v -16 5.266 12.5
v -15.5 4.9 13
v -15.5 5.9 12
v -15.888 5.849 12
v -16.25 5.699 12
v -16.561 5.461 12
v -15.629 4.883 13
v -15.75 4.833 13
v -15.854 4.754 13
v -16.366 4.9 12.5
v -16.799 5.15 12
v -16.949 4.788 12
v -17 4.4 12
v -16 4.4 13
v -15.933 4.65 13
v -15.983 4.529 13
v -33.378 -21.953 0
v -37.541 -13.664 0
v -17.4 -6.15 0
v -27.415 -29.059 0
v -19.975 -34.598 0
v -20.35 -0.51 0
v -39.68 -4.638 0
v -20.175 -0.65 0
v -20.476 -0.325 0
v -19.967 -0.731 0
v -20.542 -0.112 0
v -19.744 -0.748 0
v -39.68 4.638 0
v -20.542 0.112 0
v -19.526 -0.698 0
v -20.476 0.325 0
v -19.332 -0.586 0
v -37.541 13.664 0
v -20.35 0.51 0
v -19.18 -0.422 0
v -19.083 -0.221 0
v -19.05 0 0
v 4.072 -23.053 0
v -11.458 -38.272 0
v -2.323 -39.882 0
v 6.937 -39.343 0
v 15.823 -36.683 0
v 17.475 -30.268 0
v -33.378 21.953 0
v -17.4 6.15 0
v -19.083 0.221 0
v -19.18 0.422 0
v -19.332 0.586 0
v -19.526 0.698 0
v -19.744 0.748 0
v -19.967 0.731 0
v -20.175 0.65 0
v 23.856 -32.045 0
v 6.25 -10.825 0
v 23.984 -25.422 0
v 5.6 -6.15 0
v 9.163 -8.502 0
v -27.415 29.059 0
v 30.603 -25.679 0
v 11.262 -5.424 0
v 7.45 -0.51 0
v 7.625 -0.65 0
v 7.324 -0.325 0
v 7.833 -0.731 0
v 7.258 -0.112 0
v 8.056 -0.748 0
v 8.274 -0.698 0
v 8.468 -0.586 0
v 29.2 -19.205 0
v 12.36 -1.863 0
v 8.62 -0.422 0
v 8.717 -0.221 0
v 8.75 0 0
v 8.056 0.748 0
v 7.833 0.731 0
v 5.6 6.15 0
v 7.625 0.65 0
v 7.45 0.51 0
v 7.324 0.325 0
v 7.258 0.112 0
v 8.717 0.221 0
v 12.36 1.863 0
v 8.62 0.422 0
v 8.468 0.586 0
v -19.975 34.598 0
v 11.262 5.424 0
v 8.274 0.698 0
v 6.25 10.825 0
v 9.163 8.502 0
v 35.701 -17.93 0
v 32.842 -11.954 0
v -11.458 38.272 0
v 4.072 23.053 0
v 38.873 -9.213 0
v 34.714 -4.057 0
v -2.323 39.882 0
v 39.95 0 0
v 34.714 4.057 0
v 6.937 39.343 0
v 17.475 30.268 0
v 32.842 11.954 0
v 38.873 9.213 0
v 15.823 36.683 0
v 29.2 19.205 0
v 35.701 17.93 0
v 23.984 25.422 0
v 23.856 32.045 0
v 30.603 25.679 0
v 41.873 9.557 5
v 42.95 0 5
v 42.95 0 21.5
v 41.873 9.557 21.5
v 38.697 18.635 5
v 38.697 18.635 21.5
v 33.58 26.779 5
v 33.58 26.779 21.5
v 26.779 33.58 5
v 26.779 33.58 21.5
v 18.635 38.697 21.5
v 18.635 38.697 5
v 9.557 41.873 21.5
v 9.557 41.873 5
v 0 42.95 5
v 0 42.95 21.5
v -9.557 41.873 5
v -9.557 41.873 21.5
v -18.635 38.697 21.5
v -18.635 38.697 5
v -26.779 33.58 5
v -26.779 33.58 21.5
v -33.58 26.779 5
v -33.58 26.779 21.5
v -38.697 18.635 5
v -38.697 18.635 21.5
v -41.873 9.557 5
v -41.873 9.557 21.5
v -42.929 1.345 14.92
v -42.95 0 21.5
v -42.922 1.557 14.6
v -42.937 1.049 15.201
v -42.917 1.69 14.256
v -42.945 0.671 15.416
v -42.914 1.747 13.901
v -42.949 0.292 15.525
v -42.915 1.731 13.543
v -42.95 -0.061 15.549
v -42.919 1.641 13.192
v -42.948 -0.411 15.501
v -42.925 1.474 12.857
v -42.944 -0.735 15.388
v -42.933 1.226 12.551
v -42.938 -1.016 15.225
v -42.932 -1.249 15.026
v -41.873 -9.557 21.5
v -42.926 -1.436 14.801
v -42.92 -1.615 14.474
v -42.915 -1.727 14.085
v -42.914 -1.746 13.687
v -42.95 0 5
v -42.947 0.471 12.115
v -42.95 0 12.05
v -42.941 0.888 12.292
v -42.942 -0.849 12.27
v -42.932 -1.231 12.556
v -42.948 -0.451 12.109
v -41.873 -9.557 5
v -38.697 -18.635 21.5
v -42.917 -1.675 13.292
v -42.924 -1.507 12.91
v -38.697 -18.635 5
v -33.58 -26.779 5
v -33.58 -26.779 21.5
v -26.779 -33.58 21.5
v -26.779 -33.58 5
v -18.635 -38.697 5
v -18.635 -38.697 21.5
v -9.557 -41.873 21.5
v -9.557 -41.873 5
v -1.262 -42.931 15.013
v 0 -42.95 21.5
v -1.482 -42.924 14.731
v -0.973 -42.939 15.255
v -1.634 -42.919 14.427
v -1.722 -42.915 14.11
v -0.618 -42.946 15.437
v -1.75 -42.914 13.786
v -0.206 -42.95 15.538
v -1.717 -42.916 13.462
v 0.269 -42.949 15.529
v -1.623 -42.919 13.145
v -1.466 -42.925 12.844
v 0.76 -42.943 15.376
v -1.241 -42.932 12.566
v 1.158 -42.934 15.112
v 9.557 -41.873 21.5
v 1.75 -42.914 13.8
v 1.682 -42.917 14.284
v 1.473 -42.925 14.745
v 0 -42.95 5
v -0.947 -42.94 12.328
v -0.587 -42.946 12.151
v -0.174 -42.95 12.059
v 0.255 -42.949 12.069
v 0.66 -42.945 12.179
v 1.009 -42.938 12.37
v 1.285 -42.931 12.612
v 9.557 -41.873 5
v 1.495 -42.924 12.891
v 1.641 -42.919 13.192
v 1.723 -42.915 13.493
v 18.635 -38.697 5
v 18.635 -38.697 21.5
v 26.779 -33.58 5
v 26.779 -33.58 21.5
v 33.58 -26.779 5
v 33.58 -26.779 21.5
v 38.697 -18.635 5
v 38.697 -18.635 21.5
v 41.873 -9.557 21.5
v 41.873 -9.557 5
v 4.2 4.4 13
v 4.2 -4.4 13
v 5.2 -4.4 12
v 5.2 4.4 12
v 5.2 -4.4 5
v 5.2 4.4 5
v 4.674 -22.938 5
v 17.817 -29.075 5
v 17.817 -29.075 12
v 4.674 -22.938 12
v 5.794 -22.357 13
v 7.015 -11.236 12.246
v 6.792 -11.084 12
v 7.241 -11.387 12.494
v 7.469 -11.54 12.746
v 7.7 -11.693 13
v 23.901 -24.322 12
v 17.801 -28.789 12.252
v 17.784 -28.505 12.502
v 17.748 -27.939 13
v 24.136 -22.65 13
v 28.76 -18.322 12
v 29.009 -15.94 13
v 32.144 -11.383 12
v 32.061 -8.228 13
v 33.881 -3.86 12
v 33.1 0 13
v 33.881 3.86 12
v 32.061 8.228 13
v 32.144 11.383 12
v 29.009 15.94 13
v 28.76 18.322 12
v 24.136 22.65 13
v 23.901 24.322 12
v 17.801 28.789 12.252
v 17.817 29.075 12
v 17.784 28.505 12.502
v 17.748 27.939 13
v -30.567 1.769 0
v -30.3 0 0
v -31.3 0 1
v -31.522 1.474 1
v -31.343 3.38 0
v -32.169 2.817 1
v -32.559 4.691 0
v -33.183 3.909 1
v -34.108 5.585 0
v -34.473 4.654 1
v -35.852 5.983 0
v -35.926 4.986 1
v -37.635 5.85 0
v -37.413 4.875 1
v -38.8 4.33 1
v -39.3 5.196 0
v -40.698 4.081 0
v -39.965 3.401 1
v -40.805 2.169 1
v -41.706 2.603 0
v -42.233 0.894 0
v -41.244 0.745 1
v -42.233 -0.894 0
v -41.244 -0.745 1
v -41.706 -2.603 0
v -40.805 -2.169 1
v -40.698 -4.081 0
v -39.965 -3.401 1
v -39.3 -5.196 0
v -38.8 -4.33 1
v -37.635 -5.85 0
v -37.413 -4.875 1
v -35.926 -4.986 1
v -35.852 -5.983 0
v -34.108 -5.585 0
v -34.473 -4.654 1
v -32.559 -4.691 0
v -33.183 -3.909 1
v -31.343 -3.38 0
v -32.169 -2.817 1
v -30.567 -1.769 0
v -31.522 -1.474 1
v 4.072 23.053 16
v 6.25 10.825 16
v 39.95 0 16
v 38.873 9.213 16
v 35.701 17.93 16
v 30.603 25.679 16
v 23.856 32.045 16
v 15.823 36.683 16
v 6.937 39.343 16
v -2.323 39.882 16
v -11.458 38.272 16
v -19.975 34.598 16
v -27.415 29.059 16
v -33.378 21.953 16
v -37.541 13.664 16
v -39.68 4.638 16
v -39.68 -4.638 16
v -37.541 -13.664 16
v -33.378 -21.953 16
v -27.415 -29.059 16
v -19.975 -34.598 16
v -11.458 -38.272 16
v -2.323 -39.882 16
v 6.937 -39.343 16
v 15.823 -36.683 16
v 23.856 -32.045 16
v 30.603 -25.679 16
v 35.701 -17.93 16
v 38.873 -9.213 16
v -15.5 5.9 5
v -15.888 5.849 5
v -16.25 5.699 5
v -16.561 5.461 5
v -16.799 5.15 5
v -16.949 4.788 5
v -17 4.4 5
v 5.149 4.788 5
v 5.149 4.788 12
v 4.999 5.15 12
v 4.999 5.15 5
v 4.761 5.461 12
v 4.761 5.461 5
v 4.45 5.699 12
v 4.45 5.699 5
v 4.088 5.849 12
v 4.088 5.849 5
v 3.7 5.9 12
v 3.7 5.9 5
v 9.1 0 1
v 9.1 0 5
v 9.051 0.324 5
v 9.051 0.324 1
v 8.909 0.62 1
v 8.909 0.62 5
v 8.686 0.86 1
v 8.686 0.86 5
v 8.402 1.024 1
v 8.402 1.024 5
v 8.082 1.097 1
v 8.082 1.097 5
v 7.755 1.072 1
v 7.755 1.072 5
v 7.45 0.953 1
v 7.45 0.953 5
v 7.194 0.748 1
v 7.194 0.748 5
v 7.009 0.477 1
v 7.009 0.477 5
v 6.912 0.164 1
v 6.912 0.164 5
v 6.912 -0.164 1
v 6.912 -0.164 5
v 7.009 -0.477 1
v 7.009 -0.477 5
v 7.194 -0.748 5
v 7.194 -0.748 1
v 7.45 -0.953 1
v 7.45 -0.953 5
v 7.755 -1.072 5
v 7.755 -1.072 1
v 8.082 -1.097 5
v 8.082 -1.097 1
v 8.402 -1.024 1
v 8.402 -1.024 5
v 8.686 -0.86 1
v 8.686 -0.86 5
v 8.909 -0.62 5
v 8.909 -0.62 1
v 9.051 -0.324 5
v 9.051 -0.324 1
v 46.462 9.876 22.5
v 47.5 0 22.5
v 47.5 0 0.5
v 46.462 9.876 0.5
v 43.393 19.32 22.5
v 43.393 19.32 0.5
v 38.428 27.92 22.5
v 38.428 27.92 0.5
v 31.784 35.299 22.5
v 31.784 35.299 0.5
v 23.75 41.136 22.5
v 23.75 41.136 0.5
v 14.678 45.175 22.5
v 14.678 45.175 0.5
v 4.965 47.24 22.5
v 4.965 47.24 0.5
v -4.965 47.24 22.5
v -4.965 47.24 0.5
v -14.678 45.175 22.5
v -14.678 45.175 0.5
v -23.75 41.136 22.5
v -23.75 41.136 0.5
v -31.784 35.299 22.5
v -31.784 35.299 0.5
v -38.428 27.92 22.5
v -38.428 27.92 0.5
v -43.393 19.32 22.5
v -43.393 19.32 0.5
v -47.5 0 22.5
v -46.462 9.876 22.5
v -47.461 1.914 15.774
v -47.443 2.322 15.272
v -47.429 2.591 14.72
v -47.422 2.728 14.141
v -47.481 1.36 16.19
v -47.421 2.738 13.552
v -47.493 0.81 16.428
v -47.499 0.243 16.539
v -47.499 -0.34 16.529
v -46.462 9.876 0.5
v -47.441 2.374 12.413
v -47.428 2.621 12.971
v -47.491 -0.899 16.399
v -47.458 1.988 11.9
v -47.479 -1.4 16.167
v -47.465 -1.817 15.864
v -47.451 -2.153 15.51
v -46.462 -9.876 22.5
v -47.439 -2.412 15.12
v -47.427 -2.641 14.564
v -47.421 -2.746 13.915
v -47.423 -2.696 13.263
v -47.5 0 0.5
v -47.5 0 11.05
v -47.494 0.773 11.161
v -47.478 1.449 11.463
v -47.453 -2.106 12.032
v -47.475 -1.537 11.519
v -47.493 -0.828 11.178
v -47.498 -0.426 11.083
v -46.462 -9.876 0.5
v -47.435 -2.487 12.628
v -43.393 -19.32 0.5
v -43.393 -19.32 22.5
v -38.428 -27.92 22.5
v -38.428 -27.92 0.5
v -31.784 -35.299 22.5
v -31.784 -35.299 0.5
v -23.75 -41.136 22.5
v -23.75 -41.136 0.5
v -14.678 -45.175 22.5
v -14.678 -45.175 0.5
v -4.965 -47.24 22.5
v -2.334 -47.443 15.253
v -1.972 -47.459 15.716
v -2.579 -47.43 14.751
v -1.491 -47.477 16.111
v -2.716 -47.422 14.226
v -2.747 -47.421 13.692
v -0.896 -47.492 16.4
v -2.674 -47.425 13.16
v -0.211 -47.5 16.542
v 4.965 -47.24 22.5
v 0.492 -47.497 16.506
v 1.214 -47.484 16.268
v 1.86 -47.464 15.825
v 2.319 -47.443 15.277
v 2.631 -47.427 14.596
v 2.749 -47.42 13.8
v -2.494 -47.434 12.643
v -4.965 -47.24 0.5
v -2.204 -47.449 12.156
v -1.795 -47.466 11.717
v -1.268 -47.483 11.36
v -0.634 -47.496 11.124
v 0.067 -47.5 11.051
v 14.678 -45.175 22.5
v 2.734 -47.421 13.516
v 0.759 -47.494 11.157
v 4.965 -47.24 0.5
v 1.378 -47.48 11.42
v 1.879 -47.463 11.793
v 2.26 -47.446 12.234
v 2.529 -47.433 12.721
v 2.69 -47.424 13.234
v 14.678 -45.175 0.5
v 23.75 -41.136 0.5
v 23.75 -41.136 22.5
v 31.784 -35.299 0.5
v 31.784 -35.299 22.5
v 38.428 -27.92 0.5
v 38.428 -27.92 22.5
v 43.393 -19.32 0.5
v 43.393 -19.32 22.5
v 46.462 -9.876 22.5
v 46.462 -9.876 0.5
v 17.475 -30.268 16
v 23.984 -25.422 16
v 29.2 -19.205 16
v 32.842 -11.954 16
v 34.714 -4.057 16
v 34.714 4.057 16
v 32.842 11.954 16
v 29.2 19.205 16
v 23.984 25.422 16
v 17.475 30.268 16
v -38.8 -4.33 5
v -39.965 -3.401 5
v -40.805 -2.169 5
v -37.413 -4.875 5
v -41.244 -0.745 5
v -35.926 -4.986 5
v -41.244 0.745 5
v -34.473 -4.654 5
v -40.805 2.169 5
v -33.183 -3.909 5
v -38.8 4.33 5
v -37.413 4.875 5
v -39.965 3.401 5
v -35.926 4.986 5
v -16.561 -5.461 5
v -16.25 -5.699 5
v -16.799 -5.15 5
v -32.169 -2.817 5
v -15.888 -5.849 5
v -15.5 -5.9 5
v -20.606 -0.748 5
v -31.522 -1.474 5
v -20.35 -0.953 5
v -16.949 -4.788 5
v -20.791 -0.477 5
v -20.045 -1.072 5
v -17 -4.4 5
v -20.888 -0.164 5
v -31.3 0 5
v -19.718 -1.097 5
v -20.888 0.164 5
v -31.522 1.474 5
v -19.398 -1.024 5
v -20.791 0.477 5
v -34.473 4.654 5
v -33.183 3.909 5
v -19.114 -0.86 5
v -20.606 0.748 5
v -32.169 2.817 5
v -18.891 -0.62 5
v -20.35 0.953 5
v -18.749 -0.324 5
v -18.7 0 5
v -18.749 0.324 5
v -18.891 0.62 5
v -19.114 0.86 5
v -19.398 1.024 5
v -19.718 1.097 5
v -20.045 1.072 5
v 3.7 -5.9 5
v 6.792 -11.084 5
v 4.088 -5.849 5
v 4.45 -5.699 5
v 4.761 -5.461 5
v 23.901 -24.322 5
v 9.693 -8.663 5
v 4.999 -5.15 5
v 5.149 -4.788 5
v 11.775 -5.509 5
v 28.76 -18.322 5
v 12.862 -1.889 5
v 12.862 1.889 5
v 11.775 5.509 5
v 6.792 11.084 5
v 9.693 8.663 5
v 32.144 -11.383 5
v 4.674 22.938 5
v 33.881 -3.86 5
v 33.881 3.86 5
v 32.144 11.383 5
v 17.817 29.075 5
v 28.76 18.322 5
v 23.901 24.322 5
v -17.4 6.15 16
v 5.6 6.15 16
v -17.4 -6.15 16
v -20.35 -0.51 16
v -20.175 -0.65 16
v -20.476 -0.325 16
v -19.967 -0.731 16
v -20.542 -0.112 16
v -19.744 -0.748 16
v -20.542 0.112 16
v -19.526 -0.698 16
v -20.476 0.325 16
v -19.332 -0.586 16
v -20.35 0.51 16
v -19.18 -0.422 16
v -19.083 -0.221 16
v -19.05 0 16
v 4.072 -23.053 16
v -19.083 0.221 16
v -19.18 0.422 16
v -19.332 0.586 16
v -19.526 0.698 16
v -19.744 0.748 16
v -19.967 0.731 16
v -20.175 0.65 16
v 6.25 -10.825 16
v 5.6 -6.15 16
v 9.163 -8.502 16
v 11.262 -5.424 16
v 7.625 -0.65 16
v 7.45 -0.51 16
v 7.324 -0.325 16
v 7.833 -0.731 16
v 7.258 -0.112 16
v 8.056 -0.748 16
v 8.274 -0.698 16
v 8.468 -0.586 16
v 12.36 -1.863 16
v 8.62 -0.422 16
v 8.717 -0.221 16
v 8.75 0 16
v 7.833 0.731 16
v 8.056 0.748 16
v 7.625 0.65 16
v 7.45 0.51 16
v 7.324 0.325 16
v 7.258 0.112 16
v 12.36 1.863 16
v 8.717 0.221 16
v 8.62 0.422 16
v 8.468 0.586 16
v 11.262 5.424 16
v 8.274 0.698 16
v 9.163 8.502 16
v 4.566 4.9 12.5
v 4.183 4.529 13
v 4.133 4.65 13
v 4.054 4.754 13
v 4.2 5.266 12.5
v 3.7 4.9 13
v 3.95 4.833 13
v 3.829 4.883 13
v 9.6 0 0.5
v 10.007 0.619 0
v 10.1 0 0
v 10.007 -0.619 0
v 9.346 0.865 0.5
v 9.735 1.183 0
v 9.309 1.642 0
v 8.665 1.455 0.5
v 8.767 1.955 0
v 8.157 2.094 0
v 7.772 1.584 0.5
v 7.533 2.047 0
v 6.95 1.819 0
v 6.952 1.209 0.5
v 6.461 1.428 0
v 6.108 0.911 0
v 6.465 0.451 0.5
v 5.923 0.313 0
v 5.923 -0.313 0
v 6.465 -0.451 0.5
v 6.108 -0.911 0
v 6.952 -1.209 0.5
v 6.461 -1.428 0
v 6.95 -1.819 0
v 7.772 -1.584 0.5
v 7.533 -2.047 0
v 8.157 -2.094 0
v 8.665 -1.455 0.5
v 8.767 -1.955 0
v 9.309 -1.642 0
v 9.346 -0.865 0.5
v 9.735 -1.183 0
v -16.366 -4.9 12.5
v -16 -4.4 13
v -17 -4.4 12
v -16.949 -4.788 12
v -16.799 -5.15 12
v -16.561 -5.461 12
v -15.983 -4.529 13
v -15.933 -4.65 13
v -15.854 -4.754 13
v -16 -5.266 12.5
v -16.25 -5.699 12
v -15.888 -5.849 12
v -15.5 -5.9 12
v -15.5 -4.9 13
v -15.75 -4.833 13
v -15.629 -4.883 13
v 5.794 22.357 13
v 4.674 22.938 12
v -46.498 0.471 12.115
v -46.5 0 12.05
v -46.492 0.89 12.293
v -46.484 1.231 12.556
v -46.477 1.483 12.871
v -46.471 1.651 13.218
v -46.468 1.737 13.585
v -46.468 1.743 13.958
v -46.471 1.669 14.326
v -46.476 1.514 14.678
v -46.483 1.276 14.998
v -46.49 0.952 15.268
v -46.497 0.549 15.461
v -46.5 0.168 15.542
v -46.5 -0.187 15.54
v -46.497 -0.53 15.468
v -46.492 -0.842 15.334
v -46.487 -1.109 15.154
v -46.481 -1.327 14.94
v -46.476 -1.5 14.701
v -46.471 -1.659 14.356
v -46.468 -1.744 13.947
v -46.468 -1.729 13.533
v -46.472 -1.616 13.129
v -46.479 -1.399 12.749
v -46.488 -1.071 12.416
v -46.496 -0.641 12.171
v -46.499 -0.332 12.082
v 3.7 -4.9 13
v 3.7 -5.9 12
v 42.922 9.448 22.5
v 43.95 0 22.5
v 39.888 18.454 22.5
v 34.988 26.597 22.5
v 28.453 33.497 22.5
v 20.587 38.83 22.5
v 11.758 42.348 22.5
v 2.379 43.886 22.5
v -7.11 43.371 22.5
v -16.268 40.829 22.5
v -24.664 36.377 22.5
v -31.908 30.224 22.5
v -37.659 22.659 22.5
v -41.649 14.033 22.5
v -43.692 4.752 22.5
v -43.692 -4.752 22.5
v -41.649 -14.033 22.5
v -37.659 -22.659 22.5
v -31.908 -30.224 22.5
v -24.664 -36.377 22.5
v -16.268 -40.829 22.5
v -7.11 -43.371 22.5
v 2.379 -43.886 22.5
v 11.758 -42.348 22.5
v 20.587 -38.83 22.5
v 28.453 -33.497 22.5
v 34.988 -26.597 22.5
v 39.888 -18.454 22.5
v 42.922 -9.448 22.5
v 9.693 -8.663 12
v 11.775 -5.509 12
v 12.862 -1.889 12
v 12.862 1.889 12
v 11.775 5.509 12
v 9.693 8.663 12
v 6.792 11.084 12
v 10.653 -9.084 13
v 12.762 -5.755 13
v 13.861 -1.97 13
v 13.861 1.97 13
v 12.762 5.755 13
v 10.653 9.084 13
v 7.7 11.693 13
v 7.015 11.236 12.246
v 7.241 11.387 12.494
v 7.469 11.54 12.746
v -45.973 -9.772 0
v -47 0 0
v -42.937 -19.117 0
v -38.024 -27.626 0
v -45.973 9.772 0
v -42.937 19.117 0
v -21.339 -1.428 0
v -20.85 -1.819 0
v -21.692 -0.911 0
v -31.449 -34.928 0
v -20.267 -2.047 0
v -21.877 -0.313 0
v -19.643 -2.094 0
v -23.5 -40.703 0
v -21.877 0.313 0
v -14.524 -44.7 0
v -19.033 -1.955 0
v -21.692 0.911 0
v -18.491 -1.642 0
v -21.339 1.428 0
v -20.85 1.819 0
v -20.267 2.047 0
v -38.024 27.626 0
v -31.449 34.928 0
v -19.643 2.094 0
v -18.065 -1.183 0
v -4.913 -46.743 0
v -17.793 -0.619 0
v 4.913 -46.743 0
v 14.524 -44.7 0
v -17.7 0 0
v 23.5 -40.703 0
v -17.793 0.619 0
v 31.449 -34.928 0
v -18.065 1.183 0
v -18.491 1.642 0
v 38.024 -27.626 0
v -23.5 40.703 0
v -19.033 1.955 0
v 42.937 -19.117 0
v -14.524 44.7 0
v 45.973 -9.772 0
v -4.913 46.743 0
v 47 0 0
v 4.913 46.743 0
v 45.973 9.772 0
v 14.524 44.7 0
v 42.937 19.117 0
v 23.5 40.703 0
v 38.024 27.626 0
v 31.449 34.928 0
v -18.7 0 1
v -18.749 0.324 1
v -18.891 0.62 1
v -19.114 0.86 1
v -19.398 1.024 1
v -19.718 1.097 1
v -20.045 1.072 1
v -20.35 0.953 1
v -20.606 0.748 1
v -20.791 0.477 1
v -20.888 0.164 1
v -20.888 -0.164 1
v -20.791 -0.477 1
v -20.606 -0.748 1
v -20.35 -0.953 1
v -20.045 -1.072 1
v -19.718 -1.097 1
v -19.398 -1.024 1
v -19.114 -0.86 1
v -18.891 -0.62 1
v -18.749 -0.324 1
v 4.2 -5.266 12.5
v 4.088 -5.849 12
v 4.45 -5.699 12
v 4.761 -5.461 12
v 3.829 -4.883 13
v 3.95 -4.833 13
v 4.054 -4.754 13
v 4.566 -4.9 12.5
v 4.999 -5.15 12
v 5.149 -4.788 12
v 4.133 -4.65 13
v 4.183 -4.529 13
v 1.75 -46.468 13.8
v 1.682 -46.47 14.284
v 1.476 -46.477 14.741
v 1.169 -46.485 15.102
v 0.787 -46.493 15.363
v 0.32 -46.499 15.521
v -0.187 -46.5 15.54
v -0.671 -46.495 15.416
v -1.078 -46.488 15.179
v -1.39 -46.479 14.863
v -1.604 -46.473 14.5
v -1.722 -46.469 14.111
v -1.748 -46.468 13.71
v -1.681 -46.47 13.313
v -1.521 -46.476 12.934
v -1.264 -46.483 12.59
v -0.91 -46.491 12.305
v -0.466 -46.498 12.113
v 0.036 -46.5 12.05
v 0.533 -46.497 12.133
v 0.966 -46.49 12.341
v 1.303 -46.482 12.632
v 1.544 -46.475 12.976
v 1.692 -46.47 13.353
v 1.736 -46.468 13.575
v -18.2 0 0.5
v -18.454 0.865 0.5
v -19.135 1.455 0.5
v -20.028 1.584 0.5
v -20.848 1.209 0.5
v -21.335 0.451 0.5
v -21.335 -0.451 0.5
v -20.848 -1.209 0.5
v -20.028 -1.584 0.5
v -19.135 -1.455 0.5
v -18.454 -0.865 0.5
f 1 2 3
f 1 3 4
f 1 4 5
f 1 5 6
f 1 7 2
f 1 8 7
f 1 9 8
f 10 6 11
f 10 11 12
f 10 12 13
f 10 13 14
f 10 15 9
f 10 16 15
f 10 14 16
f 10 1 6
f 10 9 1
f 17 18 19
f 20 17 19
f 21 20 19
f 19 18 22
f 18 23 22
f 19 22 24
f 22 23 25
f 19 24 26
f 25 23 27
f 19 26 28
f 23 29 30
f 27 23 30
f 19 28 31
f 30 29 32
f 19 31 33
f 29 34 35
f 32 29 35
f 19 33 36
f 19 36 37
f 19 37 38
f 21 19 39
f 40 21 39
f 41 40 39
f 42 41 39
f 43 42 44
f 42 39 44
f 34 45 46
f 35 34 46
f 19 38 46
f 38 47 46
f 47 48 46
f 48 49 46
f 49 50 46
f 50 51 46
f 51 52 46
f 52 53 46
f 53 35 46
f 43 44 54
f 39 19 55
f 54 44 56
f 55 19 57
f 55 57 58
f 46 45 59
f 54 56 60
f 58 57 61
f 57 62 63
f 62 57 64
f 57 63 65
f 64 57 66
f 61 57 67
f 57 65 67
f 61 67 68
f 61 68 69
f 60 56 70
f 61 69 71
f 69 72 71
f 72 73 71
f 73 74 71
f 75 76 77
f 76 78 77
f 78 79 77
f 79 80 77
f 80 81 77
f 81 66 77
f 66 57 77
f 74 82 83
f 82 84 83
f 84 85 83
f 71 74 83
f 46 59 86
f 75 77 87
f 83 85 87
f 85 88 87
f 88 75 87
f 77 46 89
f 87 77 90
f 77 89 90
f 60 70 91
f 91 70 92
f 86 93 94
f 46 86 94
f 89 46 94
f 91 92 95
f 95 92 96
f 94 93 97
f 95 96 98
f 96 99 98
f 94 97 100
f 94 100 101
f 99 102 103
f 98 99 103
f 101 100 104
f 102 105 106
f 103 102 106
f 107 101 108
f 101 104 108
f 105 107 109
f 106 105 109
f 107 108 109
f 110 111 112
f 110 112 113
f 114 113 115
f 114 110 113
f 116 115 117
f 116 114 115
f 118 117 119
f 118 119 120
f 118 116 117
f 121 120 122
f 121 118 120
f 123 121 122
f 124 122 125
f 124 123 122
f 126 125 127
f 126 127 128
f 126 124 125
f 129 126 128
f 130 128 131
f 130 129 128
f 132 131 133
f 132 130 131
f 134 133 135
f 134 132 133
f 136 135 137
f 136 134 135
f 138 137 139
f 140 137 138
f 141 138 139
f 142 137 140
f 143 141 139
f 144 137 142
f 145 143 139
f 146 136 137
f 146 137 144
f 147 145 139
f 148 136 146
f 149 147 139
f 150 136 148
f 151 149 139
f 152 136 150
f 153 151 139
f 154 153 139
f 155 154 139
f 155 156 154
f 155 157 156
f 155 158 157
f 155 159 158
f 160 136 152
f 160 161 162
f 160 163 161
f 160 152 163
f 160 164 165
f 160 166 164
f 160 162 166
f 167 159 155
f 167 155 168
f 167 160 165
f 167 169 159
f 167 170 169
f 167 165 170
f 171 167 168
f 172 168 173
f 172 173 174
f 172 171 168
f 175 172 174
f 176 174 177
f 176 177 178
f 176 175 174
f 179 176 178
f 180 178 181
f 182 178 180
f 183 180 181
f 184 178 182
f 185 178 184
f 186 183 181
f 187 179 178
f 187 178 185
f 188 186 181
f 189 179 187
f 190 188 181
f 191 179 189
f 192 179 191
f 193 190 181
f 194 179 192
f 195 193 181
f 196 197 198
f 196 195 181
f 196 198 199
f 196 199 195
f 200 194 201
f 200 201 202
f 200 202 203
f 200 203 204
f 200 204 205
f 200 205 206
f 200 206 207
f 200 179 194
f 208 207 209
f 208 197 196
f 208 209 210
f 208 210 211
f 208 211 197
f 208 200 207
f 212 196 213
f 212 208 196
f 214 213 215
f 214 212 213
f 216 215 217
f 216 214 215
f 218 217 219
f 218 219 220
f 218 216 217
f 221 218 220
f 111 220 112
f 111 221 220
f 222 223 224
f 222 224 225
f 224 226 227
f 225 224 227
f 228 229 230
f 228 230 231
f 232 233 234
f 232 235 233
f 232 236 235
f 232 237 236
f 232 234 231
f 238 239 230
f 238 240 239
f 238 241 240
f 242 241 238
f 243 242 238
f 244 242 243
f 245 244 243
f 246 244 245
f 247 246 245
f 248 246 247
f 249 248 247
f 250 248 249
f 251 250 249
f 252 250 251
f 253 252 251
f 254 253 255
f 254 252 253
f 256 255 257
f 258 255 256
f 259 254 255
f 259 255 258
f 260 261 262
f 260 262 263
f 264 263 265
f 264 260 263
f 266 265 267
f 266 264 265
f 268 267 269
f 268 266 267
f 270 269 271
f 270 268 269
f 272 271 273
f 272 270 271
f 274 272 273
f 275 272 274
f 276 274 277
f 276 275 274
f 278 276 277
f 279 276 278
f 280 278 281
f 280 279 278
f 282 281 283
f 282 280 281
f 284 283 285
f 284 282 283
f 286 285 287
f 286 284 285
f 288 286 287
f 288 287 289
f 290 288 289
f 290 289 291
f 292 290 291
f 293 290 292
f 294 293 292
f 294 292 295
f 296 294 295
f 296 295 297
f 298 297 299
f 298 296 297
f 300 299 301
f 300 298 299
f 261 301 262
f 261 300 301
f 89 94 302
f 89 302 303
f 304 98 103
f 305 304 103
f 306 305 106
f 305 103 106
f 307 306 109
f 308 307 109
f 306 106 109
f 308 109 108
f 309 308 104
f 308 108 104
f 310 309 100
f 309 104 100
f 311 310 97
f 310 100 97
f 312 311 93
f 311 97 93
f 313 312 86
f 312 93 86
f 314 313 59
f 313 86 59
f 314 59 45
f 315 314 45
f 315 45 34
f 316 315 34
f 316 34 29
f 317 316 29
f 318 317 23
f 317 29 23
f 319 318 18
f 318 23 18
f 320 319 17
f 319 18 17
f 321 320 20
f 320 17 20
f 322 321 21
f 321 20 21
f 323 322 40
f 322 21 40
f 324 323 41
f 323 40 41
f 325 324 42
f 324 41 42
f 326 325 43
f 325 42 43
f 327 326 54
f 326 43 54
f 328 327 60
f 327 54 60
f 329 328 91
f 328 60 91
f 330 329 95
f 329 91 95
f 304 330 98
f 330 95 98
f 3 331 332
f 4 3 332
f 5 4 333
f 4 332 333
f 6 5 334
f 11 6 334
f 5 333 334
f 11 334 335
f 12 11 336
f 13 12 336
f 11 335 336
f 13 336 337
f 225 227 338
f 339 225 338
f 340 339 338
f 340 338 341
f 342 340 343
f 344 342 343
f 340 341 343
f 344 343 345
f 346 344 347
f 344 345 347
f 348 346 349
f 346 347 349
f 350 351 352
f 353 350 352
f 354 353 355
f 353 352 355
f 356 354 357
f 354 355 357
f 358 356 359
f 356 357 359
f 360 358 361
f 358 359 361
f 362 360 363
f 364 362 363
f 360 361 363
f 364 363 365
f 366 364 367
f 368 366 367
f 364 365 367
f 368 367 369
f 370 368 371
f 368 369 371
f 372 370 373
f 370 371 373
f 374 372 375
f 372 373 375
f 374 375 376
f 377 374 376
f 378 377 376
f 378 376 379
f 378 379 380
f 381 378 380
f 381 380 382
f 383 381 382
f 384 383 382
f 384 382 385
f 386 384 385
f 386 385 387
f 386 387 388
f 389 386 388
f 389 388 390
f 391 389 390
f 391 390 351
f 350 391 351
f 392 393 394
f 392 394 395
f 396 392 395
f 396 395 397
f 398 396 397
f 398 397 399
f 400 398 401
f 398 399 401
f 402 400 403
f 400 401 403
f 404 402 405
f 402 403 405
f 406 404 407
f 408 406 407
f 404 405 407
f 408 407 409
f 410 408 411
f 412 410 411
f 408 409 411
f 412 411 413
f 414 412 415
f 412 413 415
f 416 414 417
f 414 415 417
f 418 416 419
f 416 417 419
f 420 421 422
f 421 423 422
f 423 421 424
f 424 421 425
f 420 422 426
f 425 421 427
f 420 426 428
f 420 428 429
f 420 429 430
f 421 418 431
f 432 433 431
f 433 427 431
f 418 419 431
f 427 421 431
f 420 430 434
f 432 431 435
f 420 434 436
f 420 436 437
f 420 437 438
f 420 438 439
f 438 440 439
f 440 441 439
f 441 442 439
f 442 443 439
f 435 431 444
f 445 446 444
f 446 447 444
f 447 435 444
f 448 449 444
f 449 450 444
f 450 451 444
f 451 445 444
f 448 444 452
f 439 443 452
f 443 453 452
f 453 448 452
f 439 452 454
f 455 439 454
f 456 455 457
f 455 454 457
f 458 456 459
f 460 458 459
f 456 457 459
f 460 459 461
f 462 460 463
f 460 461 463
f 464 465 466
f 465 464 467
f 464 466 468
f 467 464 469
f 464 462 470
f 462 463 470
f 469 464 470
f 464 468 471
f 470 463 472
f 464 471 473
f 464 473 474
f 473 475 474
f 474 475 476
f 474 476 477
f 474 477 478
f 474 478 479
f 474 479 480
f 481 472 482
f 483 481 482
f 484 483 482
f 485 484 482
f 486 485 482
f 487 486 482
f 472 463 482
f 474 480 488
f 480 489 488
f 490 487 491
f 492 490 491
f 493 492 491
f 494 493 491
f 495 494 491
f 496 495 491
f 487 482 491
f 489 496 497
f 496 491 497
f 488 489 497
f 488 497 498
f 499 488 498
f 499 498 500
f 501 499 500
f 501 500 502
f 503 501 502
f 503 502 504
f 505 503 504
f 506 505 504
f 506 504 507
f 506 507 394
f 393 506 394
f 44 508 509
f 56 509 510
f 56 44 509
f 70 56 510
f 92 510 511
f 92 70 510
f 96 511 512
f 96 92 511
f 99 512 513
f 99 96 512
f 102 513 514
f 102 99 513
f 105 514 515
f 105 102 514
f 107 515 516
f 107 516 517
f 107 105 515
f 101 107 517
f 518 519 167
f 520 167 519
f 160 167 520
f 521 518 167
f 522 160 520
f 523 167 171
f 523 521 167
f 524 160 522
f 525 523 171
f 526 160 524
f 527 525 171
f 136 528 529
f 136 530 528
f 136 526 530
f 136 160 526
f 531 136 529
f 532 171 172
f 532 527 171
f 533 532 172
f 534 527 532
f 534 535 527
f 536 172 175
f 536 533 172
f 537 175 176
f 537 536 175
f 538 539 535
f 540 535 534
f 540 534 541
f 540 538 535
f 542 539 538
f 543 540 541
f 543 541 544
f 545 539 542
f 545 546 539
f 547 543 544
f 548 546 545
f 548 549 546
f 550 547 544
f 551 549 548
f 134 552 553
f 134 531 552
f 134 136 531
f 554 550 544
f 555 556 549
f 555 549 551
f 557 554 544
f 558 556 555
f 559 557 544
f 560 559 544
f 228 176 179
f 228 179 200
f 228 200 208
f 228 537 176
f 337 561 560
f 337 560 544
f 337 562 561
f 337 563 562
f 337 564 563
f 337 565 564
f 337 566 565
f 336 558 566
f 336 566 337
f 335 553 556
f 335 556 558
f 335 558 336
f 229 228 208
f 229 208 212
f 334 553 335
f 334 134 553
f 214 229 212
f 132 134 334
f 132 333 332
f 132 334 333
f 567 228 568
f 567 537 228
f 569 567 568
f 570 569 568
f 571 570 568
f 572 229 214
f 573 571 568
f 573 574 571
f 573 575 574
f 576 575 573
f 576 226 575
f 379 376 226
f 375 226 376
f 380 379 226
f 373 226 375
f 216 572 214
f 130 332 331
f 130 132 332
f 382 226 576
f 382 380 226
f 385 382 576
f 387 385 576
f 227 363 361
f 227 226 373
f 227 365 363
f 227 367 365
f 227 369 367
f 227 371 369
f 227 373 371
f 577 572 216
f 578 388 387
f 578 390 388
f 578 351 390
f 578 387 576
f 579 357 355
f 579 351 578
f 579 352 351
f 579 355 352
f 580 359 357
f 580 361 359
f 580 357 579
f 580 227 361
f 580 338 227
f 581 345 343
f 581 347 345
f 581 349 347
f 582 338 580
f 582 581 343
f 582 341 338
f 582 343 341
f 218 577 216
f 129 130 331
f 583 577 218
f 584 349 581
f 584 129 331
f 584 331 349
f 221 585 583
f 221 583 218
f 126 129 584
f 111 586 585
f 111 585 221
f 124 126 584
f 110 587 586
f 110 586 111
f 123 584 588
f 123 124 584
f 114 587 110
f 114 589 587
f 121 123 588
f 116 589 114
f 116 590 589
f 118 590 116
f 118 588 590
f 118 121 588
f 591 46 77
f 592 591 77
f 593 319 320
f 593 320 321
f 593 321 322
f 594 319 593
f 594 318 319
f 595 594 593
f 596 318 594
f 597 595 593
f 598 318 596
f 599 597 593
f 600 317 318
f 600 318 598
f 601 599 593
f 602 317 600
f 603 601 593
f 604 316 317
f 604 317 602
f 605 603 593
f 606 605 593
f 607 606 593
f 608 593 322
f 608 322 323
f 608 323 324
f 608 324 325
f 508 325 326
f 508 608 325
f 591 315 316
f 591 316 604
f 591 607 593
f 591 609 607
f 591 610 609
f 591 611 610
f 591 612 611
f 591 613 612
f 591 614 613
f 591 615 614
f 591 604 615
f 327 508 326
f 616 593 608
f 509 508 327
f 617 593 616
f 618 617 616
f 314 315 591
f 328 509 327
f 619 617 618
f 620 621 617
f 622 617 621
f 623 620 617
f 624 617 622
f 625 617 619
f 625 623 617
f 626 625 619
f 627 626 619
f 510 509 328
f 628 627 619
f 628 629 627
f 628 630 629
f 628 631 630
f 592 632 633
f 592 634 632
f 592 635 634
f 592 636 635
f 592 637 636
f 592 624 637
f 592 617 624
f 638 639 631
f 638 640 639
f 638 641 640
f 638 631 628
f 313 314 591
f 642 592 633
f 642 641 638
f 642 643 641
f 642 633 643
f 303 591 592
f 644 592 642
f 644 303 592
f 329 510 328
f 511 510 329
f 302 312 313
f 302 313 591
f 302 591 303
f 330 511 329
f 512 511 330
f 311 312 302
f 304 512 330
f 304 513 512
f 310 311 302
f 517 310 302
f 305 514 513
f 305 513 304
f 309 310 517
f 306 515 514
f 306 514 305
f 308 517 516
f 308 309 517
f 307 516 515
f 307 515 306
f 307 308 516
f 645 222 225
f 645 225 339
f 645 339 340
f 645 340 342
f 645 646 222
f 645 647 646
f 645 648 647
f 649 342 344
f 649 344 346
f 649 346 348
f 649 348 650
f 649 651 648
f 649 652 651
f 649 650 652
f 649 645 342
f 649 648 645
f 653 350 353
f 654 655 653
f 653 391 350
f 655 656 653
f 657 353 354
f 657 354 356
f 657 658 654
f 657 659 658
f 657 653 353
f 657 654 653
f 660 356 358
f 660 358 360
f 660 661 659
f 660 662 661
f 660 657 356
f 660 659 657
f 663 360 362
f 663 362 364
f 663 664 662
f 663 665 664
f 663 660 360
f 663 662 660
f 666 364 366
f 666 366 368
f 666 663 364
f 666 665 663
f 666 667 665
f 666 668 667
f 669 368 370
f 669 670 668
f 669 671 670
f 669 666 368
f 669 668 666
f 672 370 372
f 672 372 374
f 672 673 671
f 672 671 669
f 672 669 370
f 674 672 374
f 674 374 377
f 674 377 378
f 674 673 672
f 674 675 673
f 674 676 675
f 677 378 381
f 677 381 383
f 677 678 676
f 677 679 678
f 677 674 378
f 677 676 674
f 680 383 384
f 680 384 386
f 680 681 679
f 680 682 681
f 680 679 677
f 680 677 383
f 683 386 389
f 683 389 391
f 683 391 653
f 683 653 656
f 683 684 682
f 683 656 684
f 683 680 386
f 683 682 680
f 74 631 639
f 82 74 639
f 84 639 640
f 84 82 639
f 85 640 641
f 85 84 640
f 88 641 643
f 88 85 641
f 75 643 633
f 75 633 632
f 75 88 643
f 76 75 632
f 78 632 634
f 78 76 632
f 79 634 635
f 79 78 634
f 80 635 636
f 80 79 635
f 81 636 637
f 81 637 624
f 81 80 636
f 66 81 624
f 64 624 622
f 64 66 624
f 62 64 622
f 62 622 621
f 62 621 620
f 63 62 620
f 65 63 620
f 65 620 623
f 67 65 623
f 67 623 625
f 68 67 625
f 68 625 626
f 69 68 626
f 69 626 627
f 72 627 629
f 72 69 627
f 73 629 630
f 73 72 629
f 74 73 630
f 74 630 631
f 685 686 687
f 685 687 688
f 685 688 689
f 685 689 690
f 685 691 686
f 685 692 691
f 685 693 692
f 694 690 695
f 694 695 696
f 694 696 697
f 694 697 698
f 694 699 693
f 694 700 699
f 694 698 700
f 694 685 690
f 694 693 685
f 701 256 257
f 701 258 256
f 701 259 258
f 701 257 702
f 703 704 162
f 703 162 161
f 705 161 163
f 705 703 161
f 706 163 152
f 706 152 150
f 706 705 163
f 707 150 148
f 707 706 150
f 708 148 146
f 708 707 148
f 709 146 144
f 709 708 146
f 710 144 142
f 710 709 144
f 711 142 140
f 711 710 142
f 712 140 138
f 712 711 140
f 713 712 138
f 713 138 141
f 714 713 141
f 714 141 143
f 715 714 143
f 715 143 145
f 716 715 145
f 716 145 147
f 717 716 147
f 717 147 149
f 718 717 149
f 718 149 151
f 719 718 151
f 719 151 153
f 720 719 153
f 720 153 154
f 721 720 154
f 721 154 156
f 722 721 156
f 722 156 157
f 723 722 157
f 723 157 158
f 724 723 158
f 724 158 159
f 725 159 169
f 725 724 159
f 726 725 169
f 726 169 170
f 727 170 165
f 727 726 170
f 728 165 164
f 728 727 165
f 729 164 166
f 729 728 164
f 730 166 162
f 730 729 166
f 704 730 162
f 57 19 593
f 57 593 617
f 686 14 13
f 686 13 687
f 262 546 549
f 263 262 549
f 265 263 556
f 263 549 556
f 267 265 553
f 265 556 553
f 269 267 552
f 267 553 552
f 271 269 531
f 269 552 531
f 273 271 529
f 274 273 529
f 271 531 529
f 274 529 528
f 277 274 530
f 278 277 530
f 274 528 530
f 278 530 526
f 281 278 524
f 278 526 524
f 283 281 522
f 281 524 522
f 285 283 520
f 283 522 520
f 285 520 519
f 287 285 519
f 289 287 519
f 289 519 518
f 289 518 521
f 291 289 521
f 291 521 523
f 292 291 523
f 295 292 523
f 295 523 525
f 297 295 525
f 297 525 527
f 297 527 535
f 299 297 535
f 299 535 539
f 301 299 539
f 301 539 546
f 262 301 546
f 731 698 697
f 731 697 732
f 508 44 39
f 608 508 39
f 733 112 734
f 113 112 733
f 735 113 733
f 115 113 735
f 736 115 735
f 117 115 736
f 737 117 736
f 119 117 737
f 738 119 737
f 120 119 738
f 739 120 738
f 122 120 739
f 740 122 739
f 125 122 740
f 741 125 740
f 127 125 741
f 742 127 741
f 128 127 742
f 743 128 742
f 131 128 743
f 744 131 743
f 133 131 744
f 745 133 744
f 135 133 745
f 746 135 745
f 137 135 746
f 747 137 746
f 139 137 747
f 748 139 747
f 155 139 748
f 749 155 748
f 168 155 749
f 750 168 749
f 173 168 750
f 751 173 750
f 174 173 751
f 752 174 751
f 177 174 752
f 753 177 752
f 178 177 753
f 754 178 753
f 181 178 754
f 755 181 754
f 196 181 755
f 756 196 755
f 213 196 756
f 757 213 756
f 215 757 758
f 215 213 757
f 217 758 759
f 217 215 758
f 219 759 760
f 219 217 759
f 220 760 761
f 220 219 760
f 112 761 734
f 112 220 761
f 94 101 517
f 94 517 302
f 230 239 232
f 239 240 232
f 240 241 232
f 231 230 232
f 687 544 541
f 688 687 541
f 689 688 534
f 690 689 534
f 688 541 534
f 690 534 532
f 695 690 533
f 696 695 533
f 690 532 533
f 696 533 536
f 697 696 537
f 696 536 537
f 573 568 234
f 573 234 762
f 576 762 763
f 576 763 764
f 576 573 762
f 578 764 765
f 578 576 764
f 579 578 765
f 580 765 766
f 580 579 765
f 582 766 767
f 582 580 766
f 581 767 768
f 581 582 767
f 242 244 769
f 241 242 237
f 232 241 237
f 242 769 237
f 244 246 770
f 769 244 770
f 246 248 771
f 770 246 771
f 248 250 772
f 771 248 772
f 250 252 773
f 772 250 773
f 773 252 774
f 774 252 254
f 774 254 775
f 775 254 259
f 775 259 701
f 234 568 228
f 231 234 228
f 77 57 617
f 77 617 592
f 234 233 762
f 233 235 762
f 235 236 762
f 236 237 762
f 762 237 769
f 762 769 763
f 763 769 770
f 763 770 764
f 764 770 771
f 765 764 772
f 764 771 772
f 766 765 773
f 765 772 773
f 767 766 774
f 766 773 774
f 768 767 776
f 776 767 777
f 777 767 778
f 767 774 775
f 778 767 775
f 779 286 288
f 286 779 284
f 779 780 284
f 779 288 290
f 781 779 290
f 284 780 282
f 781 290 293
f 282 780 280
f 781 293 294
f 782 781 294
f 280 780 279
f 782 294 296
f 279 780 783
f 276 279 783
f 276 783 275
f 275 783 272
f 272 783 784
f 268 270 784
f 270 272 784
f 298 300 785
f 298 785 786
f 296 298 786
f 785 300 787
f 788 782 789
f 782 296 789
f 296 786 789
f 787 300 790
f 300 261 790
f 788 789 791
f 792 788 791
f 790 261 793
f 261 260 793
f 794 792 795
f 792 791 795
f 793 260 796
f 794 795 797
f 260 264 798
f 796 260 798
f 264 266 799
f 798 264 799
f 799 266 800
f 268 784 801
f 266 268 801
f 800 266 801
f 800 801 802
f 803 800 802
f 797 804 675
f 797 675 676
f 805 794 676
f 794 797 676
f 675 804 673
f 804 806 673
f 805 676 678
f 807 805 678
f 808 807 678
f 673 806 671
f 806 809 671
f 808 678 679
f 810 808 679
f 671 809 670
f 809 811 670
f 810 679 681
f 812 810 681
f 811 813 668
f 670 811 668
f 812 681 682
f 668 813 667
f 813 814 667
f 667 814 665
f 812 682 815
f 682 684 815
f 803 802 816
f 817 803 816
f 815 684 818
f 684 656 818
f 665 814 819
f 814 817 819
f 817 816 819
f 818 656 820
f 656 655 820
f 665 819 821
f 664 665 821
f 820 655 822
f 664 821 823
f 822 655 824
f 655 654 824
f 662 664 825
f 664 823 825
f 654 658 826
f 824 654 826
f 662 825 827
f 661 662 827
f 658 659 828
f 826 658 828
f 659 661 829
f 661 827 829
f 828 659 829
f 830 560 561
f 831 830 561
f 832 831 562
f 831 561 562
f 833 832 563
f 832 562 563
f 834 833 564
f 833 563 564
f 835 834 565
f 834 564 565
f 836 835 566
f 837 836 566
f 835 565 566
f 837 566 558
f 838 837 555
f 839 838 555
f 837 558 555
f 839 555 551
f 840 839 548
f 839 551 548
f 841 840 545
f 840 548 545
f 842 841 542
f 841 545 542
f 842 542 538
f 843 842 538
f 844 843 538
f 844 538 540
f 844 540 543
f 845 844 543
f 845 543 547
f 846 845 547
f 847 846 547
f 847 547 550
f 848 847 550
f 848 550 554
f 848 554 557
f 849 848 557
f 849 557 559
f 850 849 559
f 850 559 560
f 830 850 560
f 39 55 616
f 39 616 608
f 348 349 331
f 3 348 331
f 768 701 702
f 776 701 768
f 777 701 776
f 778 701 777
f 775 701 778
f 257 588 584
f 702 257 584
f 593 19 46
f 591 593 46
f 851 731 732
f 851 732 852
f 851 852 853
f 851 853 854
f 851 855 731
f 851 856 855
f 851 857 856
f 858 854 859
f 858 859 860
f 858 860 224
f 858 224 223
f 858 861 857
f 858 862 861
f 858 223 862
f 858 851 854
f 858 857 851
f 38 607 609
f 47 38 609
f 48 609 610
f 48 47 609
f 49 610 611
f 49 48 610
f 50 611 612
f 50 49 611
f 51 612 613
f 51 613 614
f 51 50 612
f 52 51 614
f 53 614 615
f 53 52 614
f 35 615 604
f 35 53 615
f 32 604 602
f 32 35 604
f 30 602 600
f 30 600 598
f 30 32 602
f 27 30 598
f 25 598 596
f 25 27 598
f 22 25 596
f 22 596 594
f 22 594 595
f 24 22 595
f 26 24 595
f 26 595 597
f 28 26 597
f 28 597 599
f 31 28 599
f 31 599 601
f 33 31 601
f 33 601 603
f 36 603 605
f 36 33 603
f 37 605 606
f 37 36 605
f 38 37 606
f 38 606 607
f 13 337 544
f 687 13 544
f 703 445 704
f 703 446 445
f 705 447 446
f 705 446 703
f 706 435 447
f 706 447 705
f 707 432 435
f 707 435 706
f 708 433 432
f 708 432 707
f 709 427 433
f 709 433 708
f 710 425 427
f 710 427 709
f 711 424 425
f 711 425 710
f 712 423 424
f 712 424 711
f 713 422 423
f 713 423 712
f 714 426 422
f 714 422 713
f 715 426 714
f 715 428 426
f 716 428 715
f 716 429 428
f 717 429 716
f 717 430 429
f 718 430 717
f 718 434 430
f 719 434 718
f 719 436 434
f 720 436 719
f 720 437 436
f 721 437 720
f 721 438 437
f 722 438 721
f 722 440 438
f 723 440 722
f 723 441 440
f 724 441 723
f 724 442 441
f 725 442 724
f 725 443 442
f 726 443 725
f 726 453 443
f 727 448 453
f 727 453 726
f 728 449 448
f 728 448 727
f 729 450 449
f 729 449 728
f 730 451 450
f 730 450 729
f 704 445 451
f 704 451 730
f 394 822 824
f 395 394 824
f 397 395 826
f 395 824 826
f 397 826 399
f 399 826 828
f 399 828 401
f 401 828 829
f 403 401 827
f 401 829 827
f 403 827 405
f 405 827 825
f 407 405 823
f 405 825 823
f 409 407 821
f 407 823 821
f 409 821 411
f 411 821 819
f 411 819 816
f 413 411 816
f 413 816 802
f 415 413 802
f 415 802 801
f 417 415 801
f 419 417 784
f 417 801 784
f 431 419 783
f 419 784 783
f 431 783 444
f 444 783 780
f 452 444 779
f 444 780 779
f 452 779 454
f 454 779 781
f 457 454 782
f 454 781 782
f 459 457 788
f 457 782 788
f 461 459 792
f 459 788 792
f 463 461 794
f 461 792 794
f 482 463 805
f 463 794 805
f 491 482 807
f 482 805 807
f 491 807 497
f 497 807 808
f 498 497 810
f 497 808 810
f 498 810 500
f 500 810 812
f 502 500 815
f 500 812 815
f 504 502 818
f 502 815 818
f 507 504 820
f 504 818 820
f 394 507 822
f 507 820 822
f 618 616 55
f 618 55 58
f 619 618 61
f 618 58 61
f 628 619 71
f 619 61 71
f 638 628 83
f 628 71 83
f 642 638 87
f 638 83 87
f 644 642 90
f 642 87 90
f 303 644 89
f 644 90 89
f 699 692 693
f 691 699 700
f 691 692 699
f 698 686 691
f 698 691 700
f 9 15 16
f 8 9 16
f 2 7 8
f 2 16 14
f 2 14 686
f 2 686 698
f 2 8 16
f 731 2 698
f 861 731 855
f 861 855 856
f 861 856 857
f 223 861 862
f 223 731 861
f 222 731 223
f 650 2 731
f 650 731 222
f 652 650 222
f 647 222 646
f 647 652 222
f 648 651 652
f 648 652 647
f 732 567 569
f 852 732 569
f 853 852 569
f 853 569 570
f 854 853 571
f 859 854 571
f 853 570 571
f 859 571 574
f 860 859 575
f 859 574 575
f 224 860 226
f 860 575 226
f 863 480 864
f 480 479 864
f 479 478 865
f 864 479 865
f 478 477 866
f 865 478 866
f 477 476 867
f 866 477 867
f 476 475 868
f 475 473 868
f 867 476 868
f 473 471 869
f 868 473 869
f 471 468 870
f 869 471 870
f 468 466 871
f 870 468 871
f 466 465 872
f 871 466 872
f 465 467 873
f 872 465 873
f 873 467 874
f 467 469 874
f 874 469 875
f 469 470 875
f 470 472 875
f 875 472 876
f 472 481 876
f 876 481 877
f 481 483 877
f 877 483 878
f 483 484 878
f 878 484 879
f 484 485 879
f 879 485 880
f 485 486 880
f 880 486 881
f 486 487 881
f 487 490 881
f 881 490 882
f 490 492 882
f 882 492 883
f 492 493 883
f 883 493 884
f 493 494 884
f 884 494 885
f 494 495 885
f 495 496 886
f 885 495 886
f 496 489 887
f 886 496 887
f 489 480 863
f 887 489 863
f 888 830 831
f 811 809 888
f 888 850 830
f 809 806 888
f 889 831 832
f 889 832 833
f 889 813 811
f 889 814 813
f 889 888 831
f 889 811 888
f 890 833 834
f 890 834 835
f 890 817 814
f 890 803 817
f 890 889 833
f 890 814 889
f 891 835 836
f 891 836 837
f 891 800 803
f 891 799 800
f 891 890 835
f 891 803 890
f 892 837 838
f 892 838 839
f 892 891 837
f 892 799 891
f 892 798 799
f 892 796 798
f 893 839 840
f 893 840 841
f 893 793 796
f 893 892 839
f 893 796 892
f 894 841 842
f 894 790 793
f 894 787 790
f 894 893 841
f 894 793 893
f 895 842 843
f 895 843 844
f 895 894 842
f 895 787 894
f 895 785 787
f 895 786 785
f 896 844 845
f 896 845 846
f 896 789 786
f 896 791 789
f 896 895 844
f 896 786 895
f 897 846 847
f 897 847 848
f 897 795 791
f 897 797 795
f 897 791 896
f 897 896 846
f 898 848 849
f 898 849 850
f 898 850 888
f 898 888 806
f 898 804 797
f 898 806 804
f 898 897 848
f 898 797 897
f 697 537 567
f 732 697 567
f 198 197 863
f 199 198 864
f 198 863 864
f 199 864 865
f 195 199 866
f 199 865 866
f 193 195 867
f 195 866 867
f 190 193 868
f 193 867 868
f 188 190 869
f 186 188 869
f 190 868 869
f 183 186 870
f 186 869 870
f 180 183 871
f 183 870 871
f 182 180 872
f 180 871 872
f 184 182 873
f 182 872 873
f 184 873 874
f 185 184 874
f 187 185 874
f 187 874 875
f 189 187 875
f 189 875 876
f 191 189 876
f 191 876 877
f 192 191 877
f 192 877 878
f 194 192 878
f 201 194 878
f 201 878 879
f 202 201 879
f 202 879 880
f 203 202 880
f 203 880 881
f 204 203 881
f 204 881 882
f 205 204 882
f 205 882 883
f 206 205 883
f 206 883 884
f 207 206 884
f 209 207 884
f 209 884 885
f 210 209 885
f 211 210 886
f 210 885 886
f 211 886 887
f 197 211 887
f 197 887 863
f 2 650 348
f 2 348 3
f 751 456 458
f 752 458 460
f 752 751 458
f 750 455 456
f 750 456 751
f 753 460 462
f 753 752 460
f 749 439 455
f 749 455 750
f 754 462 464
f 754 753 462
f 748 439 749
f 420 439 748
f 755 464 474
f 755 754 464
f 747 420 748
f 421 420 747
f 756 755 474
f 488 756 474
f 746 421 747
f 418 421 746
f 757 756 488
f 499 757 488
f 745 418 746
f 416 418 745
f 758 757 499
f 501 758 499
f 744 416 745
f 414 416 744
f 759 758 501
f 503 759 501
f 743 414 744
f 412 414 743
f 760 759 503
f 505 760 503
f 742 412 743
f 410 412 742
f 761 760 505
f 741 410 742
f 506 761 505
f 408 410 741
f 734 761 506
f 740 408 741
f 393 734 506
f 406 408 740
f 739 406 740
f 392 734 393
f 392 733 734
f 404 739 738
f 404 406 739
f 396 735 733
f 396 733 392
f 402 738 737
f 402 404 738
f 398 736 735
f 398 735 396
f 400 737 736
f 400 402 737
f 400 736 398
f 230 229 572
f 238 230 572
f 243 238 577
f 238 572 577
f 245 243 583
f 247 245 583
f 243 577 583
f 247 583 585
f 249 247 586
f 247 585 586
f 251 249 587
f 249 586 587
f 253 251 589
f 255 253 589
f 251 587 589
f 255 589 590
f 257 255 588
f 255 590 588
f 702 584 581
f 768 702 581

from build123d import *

# Parameters (mm, degrees)
SKETCH021_R     = 39.95
SKETCH021_R_2   = 0.75
SKETCH021_W     = 23
SKETCH021_H     = 12.3
PAD010_DEPTH    = 16
SKETCH_R        = 47.5
PAD_DEPTH       = 5
PAD011_DEPTH    = 8
CHAMFER_SIZE    = 1
SKETCH023_R     = 47.5
SKETCH023_R_2   = 42.95
PAD012_DEPTH    = 17.5
CHAMFER001_SIZE = 1
CHAMFER002_SIZE = 0.5
SKETCH024_R     = 1.75
POCKET_DEPTH    = 8
SKETCH025_R     = 1.75
POCKET001_DEPTH = 8
CHAMFER003_SIZE = 1
CHAMFER004_SIZE = 1
SKETCH026_R     = 1.1
SKETCH026_R_2   = 5
POCKET002_DEPTH = 8
CHAMFER005_SIZE = 1


with BuildPart() as top_layer:
    # Sketch021 → Pad010 (new body)
    with BuildSketch(Plane.XY):
        Circle(SKETCH021_R)
        with Locations((8, 0)):
            Circle(SKETCH021_R_2, mode=Mode.SUBTRACT)
        with Locations((-19.8, 0)):
            Circle(SKETCH021_R_2, mode=Mode.SUBTRACT)
        with BuildLine():
            ThreePointArc((6.249999, -10.825318), (12.5, -2e-06), (6.250002, 10.825316))
            Line((4.071802, 23.052558), (6.250002, 10.825316))
            Line((17.475007, 30.267584), (4.071802, 23.052558))
            ThreePointArc((17.474996, -30.26759), (34.95, -6e-06), (17.475007, 30.267584))
            Line((17.474996, -30.26759), (4.071794, -23.052559))
            Line((6.249999, -10.825318), (4.071794, -23.052559))
        make_face(mode=Mode.SUBTRACT)
        with Locations((-5.9, 0)):
            Rectangle(SKETCH021_W, SKETCH021_H, mode=Mode.SUBTRACT)
    extrude(amount=PAD010_DEPTH)


with BuildPart() as top_servo_layer_jig:
    # Sketch → Pad (new body)
    with BuildSketch(Plane.XY):
        Circle(SKETCH_R)
    extrude(amount=PAD_DEPTH)

    # Sketch022 (on Face3 of Pad) → Pad011 (join)
    with BuildSketch(Plane.XY.offset(5)):
        with BuildLine():
            Line((-15.5, -5.9), (3.7, -5.9))
            ThreePointArc((3.7, -5.9), (4.76066, -5.46066), (5.2, -4.4))
            Line((5.2, -4.4), (5.2, 4.4))
            ThreePointArc((5.2, 4.4), (4.76066, 5.46066), (3.7, 5.9))
            Line((3.7, 5.9), (-15.5, 5.9))
            ThreePointArc((-15.5, 5.9), (-16.56066, 5.46066), (-17, 4.4))
            Line((-17, 4.4), (-17, -4.4))
            ThreePointArc((-17, -4.4), (-16.56066, -5.46066), (-15.5, -5.9))
        make_face()
        with BuildLine():
            ThreePointArc((6.792481, -11.084322), (13, 0), (6.792481, 11.084322))
            Line((4.673847, 22.938072), (6.792481, 11.084322))
            Line((17.817201, 29.07503), (4.673847, 22.938072))
            ThreePointArc((17.817201, -29.07503), (34.1, 0), (17.817201, 29.07503))
            Line((17.817201, -29.07503), (4.673847, -22.938072))
            Line((6.792481, -11.084322), (4.673847, -22.938072))
        make_face()
    extrude(amount=PAD011_DEPTH)

    # Chamfer
    chamfer_edges = [top_servo_layer_jig.edges().sort_by_distance(p)[0] for p in [
        (-5.9, -5.9, 13),
    ]]
    chamfer(chamfer_edges, length=CHAMFER_SIZE)

    # Sketch023 (on Face4 of Chamfer) → Pad012 (join)
    with BuildSketch(Plane.XY.offset(5)):
        Circle(SKETCH023_R)
        Circle(SKETCH023_R_2, mode=Mode.SUBTRACT)
    extrude(amount=PAD012_DEPTH)

    # Chamfer001
    chamfer001_edges = [top_servo_layer_jig.edges().sort_by_distance(p)[0] for p in [
        (-42.95, 0, 22.5),
    ]]
    chamfer(chamfer001_edges, length=CHAMFER001_SIZE)

    # Chamfer002
    chamfer002_edges = [top_servo_layer_jig.edges().sort_by_distance(p)[0] for p in [
        (-47.5, 0, 0),
    ]]
    chamfer(chamfer002_edges, length=CHAMFER002_SIZE)

    # Sketch024 (on DatumPlane) → Pocket (cut)
    with BuildSketch(Plane(origin=(-50, 0, 22.5), x_dir=(0, 0, -1), z_dir=(1, 0, 0))):
        with Locations((8.7, 0)):
            Circle(SKETCH024_R)
    extrude(amount=POCKET_DEPTH, mode=Mode.SUBTRACT)

    # Sketch025 (on DatumPlane) → Pocket001 (cut)
    with BuildSketch(Plane(origin=(0, -50, 22.5), x_dir=(1, 0, 0), z_dir=(0, -1, 0))):
        with Locations((0, -8.7)):
            Circle(SKETCH025_R)
    extrude(amount=-POCKET001_DEPTH, mode=Mode.SUBTRACT)

    # Chamfer003
    chamfer003_edges = [top_servo_layer_jig.edges().sort_by_distance(p)[0] for p in [
        (-47.5, 0, 15.55),
        (-1.75, -47.467752, 13.8),
    ]]
    chamfer(chamfer003_edges, length=CHAMFER003_SIZE)

    # Chamfer004
    chamfer004_edges = [top_servo_layer_jig.edges().sort_by_distance(p)[0] for p in [
        (5.733164, -17.011197, 13),
        (13, 0, 13),
        (5.733164, 17.011197, 13),
        (11.245524, 26.006551, 13),
        (34.1, 0, 13),
        (11.245524, -26.006551, 13),
    ]]
    chamfer(chamfer004_edges, length=CHAMFER004_SIZE)

    # Sketch026 (on Face4 of Chamfer004) → Pocket002 (cut)
    with BuildSketch(Plane.XY.offset(5)):
        with Locations((8, 0)):
            Circle(SKETCH026_R)
        with Locations((-19.8, 0)):
            Circle(SKETCH026_R)
        with Locations((-36.3, 0)):
            Circle(SKETCH026_R_2)
    extrude(amount=-POCKET002_DEPTH, mode=Mode.SUBTRACT)

    # Chamfer005
    chamfer005_edges = [top_servo_layer_jig.edges().sort_by_distance(p)[0] for p in [
        (6.9, 0, 0),
        (-20.9, 0, 0),
        (-41.3, 0, 0),
    ]]
    chamfer(chamfer005_edges, length=CHAMFER005_SIZE)


solid = Compound([top_layer.part, top_servo_layer_jig.part])
